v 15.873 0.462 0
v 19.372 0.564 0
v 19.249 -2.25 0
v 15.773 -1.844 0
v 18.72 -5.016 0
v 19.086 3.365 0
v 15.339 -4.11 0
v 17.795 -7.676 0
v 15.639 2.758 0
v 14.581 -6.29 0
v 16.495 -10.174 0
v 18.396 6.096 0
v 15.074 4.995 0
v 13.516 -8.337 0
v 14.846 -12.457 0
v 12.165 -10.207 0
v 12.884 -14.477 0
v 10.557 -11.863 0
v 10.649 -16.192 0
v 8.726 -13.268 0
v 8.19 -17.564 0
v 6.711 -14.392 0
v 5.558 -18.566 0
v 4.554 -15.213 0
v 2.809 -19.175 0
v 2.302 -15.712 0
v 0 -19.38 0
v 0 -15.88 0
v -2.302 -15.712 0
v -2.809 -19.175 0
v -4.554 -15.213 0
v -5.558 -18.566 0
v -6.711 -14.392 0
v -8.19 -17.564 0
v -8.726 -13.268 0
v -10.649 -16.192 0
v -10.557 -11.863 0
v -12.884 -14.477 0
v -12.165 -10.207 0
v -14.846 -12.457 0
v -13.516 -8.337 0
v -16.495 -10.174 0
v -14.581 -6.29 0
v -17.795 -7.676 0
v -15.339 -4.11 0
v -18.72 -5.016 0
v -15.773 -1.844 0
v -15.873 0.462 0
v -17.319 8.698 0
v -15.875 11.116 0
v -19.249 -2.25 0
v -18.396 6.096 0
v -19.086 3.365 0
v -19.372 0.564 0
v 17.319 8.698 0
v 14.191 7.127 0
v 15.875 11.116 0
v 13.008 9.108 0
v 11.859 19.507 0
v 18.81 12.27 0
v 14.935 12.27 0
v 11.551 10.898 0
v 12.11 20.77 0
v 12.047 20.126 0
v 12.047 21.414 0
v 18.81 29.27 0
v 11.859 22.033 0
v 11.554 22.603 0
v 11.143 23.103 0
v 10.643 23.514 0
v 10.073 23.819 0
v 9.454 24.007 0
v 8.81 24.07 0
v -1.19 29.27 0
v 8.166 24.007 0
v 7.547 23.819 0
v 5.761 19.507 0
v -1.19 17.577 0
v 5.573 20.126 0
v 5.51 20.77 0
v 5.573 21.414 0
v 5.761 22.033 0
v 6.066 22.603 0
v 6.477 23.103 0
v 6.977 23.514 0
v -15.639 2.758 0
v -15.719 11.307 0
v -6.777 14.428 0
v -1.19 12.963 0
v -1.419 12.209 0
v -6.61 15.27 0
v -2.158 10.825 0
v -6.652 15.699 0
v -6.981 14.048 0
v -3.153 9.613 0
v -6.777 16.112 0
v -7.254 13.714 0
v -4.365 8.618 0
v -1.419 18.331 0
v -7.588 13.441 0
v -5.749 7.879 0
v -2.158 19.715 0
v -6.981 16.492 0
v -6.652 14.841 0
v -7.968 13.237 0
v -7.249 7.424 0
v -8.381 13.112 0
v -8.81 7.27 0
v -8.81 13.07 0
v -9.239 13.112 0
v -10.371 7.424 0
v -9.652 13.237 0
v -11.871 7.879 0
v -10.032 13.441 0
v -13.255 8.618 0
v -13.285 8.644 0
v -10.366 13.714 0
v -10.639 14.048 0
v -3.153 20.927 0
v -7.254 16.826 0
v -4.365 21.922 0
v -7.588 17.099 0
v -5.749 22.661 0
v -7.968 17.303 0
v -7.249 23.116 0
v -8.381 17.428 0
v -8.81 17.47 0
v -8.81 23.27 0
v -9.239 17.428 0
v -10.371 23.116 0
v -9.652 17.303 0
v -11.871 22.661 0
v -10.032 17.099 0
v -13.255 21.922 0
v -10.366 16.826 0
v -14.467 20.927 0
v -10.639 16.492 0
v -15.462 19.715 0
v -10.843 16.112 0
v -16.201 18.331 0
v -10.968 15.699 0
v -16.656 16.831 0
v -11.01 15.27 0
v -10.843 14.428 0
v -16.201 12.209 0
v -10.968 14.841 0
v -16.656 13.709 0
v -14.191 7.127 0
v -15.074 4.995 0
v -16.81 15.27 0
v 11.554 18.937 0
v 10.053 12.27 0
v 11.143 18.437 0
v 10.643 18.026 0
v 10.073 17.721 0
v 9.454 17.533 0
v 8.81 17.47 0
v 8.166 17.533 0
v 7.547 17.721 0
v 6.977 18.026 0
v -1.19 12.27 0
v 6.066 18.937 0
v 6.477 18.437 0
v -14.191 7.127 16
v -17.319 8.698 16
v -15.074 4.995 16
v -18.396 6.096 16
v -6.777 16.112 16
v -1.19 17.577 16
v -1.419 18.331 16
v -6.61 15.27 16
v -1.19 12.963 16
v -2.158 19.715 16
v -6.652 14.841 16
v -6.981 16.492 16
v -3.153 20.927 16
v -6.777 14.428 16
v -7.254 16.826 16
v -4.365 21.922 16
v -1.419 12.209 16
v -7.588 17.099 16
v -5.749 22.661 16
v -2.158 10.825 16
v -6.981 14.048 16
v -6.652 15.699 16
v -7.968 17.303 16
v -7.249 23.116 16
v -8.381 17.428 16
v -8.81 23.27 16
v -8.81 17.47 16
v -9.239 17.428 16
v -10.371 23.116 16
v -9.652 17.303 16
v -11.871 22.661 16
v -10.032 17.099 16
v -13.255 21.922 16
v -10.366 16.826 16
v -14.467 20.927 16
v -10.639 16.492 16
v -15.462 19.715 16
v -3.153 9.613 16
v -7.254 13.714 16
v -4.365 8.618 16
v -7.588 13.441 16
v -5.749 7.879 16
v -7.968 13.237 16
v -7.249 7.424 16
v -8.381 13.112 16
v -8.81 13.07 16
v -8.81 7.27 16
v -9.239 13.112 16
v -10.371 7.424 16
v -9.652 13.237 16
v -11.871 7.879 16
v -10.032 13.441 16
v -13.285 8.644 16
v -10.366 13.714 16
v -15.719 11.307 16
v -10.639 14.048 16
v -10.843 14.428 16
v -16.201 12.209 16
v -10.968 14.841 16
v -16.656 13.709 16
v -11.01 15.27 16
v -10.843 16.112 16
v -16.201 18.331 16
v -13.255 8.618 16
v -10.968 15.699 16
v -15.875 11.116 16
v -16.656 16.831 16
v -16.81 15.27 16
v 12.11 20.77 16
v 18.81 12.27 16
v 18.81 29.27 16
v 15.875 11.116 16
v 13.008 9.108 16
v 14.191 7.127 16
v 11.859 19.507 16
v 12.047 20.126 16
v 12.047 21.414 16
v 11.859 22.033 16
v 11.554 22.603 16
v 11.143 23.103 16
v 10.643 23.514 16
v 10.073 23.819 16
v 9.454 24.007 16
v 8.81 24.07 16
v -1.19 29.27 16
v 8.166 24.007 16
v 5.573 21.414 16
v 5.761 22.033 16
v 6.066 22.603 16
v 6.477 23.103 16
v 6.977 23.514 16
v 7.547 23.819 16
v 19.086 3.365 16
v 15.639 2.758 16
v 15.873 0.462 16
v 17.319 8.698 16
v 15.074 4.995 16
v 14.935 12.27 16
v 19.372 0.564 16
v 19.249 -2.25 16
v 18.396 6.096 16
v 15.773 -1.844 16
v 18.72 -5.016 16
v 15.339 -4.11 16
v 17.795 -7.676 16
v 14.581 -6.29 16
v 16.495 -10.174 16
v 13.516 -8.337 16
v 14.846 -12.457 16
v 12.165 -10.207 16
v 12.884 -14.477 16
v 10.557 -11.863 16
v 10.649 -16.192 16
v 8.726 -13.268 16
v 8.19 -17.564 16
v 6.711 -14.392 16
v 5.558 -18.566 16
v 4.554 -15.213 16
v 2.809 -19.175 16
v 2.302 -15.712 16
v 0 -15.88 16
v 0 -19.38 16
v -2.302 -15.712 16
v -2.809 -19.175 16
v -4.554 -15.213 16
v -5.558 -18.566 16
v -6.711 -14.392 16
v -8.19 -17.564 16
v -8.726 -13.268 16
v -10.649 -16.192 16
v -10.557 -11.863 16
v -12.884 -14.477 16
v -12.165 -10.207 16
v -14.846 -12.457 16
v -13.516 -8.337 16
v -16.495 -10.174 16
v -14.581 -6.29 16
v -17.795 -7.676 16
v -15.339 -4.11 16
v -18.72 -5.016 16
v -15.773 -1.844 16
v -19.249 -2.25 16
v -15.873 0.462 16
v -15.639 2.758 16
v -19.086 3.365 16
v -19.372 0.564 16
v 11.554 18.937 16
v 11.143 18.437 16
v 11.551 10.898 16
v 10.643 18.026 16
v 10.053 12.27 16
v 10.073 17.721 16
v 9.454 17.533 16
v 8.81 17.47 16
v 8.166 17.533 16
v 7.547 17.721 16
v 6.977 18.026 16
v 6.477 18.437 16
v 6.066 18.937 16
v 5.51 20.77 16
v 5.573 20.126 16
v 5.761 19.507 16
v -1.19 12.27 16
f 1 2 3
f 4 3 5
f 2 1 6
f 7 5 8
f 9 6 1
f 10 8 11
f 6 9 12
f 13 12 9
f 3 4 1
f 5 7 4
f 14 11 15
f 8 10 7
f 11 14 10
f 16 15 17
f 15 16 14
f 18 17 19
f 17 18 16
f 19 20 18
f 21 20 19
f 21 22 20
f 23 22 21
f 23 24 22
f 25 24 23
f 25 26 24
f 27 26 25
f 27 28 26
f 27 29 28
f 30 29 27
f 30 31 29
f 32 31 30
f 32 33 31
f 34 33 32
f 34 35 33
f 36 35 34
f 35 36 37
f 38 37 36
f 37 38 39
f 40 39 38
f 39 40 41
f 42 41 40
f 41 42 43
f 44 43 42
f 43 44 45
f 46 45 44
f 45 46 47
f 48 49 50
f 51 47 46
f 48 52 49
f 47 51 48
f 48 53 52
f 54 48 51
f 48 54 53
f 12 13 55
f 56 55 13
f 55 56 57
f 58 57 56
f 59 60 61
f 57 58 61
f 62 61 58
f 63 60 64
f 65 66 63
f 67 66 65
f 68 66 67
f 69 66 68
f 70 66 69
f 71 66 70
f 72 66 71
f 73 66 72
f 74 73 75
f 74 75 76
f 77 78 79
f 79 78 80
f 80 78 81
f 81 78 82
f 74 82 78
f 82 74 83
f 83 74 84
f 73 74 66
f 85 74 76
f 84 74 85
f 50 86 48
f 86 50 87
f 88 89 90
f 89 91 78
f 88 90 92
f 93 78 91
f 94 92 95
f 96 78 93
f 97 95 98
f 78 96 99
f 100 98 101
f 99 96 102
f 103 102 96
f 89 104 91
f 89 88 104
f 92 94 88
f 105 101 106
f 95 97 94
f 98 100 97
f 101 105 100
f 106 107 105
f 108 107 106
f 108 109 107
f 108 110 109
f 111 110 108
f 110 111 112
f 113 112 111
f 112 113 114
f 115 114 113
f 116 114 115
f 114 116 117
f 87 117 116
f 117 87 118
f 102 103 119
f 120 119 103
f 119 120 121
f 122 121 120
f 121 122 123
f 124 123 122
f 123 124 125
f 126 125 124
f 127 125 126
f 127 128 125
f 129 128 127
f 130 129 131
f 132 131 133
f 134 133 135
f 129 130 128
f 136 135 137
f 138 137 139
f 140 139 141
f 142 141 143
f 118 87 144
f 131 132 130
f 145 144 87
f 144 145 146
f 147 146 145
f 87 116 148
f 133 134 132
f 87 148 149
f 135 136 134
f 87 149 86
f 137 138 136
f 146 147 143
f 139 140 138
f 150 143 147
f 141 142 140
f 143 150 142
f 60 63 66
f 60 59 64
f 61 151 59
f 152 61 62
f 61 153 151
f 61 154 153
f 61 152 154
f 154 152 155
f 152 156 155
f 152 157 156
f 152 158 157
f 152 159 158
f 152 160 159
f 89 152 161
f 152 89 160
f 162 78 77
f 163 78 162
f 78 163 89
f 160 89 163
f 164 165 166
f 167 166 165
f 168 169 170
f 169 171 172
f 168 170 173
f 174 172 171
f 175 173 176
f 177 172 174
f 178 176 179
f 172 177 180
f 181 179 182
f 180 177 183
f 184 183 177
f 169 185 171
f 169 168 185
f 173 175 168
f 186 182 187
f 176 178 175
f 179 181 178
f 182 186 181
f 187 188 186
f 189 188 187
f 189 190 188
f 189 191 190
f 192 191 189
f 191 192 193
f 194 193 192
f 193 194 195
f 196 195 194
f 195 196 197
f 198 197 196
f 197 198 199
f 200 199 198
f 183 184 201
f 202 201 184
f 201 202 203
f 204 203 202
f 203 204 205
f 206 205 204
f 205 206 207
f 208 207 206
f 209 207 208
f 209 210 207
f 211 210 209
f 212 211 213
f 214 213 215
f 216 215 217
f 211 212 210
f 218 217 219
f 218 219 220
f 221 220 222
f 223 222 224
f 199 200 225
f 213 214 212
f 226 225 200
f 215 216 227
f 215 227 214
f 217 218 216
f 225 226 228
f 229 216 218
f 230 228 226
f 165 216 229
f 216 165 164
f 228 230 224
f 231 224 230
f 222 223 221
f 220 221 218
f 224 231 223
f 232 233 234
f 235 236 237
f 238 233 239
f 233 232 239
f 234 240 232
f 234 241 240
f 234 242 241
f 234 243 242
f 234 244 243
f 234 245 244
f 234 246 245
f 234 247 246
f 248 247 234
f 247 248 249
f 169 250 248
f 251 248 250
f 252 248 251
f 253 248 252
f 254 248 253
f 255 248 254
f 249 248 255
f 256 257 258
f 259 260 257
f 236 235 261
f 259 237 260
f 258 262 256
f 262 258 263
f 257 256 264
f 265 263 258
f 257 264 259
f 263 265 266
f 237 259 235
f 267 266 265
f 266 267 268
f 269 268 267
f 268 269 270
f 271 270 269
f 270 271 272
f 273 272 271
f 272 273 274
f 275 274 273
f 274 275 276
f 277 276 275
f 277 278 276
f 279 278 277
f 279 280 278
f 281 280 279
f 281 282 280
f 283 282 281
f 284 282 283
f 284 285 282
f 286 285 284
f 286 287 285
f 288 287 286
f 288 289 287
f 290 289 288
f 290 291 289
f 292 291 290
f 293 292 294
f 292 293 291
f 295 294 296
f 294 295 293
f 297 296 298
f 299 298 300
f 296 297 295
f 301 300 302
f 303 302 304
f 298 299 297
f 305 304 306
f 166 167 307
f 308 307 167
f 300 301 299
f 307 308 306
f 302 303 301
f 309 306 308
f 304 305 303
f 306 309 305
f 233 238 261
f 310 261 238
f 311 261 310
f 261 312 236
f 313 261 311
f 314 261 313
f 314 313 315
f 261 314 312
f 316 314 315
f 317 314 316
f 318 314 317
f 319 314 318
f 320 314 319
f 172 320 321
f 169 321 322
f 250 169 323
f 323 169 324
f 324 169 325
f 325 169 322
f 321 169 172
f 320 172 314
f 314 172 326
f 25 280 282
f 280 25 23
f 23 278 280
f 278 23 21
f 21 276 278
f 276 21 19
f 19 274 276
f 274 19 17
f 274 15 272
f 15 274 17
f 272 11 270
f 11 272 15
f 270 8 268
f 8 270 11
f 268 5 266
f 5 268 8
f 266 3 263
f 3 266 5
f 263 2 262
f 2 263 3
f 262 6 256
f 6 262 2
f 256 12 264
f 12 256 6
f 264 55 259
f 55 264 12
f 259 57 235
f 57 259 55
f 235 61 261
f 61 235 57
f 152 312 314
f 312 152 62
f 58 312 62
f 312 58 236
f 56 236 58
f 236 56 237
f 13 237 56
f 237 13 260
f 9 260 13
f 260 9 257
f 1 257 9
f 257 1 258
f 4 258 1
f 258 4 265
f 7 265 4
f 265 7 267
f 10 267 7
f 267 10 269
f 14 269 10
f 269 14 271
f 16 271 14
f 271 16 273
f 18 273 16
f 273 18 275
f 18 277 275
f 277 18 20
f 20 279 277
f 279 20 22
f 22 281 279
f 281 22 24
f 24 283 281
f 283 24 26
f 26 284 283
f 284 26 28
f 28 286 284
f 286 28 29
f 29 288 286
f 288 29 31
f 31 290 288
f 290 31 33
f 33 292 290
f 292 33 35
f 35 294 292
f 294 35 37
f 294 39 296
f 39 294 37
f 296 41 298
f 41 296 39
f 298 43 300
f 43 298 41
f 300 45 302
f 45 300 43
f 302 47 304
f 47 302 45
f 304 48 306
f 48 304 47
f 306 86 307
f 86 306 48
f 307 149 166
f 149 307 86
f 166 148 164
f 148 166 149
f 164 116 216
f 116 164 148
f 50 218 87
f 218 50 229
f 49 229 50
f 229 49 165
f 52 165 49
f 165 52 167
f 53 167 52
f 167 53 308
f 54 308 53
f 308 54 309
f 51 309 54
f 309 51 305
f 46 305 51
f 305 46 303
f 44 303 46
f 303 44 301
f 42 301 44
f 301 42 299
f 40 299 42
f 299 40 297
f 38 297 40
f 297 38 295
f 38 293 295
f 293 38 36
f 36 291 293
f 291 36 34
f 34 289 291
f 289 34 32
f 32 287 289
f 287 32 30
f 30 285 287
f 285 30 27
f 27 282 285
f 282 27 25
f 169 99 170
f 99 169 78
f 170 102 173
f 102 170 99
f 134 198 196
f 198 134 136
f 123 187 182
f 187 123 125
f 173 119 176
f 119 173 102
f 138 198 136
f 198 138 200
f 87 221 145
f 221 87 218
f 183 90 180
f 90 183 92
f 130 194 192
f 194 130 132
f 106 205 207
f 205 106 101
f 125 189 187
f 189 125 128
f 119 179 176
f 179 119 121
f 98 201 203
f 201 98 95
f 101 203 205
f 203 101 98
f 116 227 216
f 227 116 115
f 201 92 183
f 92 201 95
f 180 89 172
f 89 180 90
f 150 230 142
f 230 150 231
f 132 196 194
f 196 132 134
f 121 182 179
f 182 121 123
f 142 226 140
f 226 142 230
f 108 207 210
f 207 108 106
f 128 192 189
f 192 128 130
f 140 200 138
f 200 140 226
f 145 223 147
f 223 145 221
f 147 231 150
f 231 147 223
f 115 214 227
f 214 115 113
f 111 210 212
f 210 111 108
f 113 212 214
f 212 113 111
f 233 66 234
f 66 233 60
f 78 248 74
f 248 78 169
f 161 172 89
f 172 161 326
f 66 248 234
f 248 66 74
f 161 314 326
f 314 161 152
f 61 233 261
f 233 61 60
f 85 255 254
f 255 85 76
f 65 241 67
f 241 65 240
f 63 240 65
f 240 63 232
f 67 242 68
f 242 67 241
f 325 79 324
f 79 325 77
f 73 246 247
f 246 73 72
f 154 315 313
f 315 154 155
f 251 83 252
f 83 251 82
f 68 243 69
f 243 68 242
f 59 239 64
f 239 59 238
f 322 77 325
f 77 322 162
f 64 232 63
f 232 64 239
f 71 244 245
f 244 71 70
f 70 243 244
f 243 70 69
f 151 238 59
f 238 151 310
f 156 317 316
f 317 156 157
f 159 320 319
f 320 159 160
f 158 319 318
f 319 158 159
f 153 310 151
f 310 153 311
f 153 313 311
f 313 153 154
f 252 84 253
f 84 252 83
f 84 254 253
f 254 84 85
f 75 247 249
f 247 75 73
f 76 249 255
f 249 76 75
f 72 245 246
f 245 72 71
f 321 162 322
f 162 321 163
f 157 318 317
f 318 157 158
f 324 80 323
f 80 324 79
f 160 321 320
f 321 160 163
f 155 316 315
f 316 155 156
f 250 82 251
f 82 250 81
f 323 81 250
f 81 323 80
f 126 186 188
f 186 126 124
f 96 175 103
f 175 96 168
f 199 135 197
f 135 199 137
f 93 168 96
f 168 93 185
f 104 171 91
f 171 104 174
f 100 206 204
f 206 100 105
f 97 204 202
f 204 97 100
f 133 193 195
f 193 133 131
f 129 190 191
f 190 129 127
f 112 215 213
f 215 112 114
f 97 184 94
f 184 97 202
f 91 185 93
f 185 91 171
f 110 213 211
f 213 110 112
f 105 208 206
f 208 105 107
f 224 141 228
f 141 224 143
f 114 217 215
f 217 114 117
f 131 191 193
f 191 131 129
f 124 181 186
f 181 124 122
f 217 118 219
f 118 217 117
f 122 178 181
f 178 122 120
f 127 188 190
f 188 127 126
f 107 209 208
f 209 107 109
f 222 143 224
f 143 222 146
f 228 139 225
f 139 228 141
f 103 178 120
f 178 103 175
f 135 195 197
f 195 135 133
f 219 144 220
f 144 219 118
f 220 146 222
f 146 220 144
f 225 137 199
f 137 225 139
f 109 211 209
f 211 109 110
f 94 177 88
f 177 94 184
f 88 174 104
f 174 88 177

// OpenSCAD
$fn = 32;

// ----------------------------------------------------------------------
// Pipe clamp: 38.76 mm ring, 3.5 mm wall, 16 mm wide
// ----------------------------------------------------------------------

// --- parameters (mm) ---
outer_r = 19.38;          // clamp outside radius
inner_r = 15.88;          // pipe bore radius
band = 3.5;               // band thickness
clamp_w = 16;             // clamp width
opening = 60;             // opening angle between the ends
lug_w = 20;               // lug width
lug_len = 17;             // lug length
bolt_d = 6.6;             // bolt hole
knuckle_d = 16;           // hinge knuckle diameter
pin_d = 4.4;              // hinge pin hole

clamp_profile = [[-9.69, 16.784], [-12.02, 15.202], [-14.097, 13.299], [-15.875, 11.116], [-17.319, 8.698], [-18.396, 6.096], [-19.086, 3.365], [-19.372, 0.564], [-19.249, -2.25], [-18.72, -5.016], [-17.795, -7.676], [-16.495, -10.174], [-14.846, -12.457], [-12.884, -14.477], [-10.649, -16.192], [-8.19, -17.564], [-5.558, -18.566], [-2.809, -19.175], [0, -19.38], [2.809, -19.175], [5.558, -18.566], [8.19, -17.564], [10.649, -16.192], [12.884, -14.477], [14.846, -12.457], [16.495, -10.174], [17.795, -7.676], [18.72, -5.016], [19.249, -2.25], [19.372, 0.564], [19.086, 3.365], [18.396, 6.096], [17.319, 8.698], [15.875, 11.116], [14.097, 13.299], [12.02, 15.202], [9.69, 16.784], [7.94, 13.752], [9.849, 12.457], [11.551, 10.898], [13.008, 9.108], [14.191, 7.127], [15.074, 4.995], [15.639, 2.758], [15.873, 0.462], [15.773, -1.844], [15.339, -4.11], [14.581, -6.29], [13.516, -8.337], [12.165, -10.207], [10.557, -11.863], [8.726, -13.268], [6.711, -14.392], [4.554, -15.213], [2.302, -15.712], [0, -15.88], [-2.302, -15.712], [-4.554, -15.213], [-6.711, -14.392], [-8.726, -13.268], [-10.557, -11.863], [-12.165, -10.207], [-13.516, -8.337], [-14.581, -6.29], [-15.339, -4.11], [-15.773, -1.844], [-15.873, 0.462], [-15.639, 2.758], [-15.074, 4.995], [-14.191, 7.127], [-13.008, 9.108], [-11.551, 10.898], [-9.849, 12.457], [-7.94, 13.752]];

difference() {
  union() {
    linear_extrude(height = clamp_w) polygon(clamp_profile);
    /* hinge knuckle, sunk 2 mm into the band end */
    translate([-8.81, 15.27, 0]) cylinder(h = clamp_w, d = knuckle_d);
    /* bolt lug on the other end */
    translate([-1.19, 12.27, 0]) cube([lug_w, 17, clamp_w]);
  }
  translate([8.81, 20.77, -2.5]) cylinder(h = clamp_w + 5, d = bolt_d);
  translate([-8.81, 15.27, -2.5]) cylinder(h = clamp_w + 5, d = pin_d);
}
